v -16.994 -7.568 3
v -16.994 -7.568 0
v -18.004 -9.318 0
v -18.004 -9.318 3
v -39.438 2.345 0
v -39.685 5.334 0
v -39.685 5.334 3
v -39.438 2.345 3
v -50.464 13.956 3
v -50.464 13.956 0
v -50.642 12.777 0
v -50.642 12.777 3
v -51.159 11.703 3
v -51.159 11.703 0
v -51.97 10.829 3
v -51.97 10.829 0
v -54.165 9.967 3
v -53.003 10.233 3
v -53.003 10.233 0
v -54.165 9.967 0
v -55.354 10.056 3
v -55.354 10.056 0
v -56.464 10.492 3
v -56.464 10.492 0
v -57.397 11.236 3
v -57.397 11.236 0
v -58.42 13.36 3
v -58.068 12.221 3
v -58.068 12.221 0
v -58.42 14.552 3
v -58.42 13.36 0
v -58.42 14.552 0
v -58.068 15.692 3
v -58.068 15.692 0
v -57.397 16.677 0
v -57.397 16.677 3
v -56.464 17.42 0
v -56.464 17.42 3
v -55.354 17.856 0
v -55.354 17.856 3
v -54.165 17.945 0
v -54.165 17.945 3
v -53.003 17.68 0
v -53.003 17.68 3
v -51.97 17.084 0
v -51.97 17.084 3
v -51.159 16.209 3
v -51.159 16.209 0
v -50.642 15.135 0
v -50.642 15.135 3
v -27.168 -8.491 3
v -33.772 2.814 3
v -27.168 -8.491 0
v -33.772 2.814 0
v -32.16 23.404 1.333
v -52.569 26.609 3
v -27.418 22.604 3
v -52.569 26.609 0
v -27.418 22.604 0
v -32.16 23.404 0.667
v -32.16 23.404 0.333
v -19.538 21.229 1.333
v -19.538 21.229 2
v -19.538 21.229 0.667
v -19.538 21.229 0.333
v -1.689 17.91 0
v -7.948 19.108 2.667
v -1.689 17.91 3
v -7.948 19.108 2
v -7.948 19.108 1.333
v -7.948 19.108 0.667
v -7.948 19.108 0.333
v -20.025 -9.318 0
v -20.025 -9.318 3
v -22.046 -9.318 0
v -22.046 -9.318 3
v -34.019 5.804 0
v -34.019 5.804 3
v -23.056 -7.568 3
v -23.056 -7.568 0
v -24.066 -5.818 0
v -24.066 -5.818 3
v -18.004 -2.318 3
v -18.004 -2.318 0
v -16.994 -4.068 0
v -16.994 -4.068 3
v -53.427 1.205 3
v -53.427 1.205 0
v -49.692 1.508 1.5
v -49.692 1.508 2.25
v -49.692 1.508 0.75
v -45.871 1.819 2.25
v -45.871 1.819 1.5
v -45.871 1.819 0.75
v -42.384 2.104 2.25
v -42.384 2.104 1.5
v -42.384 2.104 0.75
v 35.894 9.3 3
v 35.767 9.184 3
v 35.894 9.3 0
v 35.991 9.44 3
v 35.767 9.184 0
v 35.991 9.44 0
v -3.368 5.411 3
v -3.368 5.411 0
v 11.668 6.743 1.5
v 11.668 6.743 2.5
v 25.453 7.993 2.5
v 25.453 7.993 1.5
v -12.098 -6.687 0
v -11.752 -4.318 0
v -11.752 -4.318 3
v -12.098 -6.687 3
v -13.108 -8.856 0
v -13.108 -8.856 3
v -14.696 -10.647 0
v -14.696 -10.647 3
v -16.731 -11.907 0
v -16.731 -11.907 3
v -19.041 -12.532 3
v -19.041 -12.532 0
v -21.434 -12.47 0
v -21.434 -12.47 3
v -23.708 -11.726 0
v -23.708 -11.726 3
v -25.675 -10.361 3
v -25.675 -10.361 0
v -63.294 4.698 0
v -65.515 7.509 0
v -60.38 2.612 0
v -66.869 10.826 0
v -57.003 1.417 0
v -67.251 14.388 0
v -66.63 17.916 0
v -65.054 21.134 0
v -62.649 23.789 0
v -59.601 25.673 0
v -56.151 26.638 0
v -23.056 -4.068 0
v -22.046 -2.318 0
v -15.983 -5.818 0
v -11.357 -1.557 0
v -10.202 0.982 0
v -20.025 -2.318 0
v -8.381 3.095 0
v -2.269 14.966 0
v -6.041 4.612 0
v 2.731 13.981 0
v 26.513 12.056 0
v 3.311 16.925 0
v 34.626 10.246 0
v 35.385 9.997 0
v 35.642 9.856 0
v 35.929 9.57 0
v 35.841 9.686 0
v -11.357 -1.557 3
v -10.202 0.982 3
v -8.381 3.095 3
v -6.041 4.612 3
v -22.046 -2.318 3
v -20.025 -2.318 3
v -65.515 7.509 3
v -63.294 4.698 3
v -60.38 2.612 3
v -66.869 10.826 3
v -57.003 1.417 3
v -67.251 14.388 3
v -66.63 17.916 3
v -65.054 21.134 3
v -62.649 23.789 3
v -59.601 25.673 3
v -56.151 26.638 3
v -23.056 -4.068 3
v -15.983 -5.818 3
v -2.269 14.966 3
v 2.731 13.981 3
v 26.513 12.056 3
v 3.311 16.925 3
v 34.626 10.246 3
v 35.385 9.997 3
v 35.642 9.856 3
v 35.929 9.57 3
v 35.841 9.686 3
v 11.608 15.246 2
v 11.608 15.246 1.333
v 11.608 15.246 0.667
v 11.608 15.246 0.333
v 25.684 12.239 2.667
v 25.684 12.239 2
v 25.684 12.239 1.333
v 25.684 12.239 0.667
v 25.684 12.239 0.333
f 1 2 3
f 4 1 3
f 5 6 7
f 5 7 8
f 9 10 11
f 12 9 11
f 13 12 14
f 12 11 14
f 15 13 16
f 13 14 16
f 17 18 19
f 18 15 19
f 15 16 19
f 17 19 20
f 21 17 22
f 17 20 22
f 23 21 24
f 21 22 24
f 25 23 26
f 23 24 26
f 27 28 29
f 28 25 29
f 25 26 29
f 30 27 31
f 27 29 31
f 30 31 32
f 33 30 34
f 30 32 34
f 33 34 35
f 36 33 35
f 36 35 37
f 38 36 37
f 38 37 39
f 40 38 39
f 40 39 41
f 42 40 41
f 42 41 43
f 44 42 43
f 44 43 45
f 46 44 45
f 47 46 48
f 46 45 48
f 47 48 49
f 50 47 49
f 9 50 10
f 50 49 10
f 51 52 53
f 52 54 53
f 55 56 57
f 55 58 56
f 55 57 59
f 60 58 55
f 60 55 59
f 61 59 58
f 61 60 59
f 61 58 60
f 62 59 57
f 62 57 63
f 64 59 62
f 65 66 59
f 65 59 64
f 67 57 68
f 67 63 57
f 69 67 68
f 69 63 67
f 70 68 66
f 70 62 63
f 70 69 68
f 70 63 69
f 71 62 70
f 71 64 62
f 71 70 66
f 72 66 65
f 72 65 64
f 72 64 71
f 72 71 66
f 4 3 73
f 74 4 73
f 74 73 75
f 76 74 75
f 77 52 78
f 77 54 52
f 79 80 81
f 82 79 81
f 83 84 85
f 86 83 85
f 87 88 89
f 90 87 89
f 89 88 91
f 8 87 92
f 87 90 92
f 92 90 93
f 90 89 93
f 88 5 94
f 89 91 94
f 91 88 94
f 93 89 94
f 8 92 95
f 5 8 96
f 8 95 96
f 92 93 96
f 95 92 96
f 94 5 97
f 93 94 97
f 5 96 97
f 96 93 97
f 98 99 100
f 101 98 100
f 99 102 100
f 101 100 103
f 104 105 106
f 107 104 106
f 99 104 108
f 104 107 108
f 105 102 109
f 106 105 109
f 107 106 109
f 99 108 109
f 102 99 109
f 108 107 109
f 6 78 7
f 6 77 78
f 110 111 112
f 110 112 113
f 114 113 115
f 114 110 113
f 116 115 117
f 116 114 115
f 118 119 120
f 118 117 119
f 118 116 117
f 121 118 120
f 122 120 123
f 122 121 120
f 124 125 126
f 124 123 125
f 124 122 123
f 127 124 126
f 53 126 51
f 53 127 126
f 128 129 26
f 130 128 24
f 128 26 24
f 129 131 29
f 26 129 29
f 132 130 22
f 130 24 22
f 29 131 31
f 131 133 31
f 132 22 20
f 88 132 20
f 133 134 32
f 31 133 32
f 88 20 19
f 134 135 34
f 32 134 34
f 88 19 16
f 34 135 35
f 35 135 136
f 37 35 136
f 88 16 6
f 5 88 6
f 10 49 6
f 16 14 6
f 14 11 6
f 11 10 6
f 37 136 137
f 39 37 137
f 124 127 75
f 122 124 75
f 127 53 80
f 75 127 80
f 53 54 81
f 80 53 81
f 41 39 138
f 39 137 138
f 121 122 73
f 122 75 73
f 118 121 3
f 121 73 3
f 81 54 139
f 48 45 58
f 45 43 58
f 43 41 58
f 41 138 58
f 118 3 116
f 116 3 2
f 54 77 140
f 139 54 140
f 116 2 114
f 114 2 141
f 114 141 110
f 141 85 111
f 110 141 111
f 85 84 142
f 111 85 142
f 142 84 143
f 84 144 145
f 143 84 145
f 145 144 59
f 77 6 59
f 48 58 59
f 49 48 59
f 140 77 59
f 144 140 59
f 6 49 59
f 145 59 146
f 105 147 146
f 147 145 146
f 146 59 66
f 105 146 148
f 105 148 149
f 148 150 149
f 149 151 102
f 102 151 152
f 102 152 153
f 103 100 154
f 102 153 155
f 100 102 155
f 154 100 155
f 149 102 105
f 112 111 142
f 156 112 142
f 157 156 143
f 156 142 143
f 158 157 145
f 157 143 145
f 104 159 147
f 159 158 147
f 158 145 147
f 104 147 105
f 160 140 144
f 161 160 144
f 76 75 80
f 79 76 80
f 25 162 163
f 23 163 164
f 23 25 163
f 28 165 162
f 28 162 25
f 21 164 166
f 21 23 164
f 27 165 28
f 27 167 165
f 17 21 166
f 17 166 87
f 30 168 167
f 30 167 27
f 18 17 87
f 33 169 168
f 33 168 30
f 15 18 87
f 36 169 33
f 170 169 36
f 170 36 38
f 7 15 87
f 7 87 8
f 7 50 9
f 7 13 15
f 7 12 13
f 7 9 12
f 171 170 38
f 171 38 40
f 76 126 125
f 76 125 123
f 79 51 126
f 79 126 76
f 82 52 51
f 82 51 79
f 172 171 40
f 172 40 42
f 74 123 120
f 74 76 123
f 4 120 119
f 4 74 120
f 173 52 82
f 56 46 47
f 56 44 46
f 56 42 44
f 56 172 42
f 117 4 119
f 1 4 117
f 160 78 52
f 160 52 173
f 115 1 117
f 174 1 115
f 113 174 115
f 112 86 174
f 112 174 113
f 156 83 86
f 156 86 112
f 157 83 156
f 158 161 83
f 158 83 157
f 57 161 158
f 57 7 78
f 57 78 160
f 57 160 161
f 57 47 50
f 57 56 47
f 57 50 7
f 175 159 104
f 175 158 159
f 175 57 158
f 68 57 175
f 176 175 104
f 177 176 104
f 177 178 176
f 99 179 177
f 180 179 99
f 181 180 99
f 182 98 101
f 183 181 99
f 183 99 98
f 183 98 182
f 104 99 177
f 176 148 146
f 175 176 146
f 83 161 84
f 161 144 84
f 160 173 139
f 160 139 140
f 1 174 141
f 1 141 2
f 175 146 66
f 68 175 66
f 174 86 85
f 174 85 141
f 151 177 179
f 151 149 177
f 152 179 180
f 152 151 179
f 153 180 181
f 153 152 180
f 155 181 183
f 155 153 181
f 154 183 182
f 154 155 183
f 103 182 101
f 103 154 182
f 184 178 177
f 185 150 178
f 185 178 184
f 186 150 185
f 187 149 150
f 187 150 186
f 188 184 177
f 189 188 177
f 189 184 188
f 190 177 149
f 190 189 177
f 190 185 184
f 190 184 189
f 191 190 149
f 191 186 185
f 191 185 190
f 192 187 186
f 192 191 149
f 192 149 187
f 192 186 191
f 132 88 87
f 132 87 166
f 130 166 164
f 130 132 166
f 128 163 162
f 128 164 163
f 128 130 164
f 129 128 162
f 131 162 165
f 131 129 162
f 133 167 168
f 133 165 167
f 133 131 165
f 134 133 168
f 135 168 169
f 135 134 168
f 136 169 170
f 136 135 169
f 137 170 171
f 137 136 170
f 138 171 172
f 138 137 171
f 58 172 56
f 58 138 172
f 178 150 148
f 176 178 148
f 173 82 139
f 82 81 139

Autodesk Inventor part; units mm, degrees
ref_plane "YZ Plane" through (0, 0, 0) normal (1, 0, 0) x (0, 1, 0)
ref_plane "XZ Plane" through (0, 0, 0) normal (0, 1, 0) x (-1, 0, 0)
ref_plane "XY Plane" through (0, 0, 0) normal (0, 0, 1) x (1, 0, 0)
sketch "Sketch1" plane through (0, 0, 0) normal (0, 0, 1) x (1, 0, 0)
  spline S0 degree 2 poles (-40.9982, 18.5994) (-40.8895, 18.5833) (-40.7809, 18.5671) knots 0 0 0 1 1 1
  line L0 (-40.803, 18.5704) -> (-40.7587, 18.5638) construction
  arc A0 (-40.7631, 18.5645) -> (-40.7986, 18.5698) centre (-56.3605, -86.2568) ccw construction
  line L1 (-39.6852, 5.3344) -> (-39.4376, 2.3446)
  line L2 (-39.4376, 2.3446) -> (-33.7717, 2.8138)
  line L3 (-33.7717, 2.8138) -> (-34.0193, 5.8036)
  line L4 (-2.2691, 14.9664) -> (-1.6892, 17.9098)
  line L5 (2.7309, 13.9813) -> (-2.2691, 14.9664)
  line L6 (3.3108, 16.9248) -> (2.7309, 13.9813)
  line L7 (-1.6892, 17.9098) -> (3.3108, 16.9248)
  spline S1 degree 4 poles (-52.5686, 26.6086) (-47.4283, 25.8385) (-38.8524, 24.5329) (-27.5314, 22.6621) (-13.8317, 20.2238) (-2.8447, 18.1596) (6.9136, 16.2106) (15.3612, 14.4912) (22.3415, 12.9265) (29.1518, 11.5542) (33.1688, 10.3476) (35.6871, 10.2817) (35.9914, 9.4396) knots 0 0 0 0 0 0.183688 0.302378 0.416104 0.523956 0.624947 0.717922 0.80148 0.87369 1 1 1 1 1
  line L8 (-34.0193, 5.8036) -> (-39.6852, 5.3344)
  arc A1 (-52.5686, 26.6086) -> (-53.4266, 1.2046) centre (-54.4643, 13.9562) ccw
  circle A2 centre (-54.4643, 13.9562) radius 4
  circle A3 centre (-20.0248, -5.8183) radius 3.5
  line L9 (-33.7717, 2.8138) -> (-27.1682, -8.491)
  arc A4 (-3.3682, 5.4114) -> (-11.7521, -4.3183) centre (-1.9143, -4.3183) ccw
  arc A5 (-27.1682, -8.491) -> (-11.7521, -4.3183) centre (-20.0248, -4.3183) ccw
  spline S2 degree 4 poles (-53.4266, 1.2046) (-47.7035, 1.6704) (-39.4686, 2.3386) (-37.3837, 2.5127) (-33.7717, 2.8138) knots 0 0 0 0 0 1 1 1 1 1
  line L10 (-35.7599, 2.6481) -> (-31.7835, 2.9795) construction
  arc A6 (-32.1812, 2.9462) -> (-35.3623, 2.6811) centre (796.8879, -9962.6267) ccw construction
  spline S3 degree 4 poles (-3.3682, 5.4114) (-2.8714, 5.455) (-2.6988, 5.4696) (10.1379, 6.6067) (14.5902, 6.9981) (22.2245, 7.7443) (28.8501, 8.2309) (33.1083, 8.9133) (35.5672, 8.6498) (35.9914, 9.4396) knots 0 0 0 0 0 0.172623 0.316544 0.485874 0.63811 0.76971 1 1 1 1 1
  line L11 (-7.9773, 5.0072) -> (1.2409, 5.8157) construction
  arc A7 (0.3196, 5.7283) -> (-7.0549, 5.0815) centre (88.3466, -1040.3487) ccw construction
  line L12 (70.0994, 77.6585) -> (70.0994, -40.6368)
  line L13 (142.4679, 14.9664) -> (141.888, 17.9098)
  line L14 (137.4679, 13.9813) -> (142.4679, 14.9664)
  line L15 (136.888, 16.9248) -> (137.4679, 13.9813)
  line L16 (141.888, 17.9098) -> (136.888, 16.9248)
  spline S4 degree 4 poles (192.7674, 26.6086) (187.6271, 25.8385) (179.0512, 24.5329) (167.7302, 22.6621) (154.0305, 20.2238) (143.0435, 18.1596) (133.2852, 16.2106) (124.8376, 14.4912) (117.8573, 12.9265) (111.047, 11.5542) (107.03, 10.3476) (104.5117, 10.2817) (104.2074, 9.4396) knots 0 0 0 0 0 0.183688 0.302378 0.416104 0.523956 0.624947 0.717922 0.80148 0.87369 1 1 1 1 1
  spline S5 degree 2 poles (181.197, 18.5994) (181.0883, 18.5833) (180.9797, 18.5671) knots 0 0 0 1 1 1
  line L17 (181.0018, 18.5704) -> (180.9575, 18.5638) construction
  arc A8 (180.9974, 18.5698) -> (180.9619, 18.5645) centre (196.5593, -86.2568) ccw construction
  line L18 (173.9705, 2.8138) -> (174.2181, 5.8036)
  line L19 (174.2181, 5.8036) -> (179.8839, 5.3344)
  line L20 (179.8839, 5.3344) -> (179.6364, 2.3446)
  line L21 (179.6364, 2.3446) -> (173.9705, 2.8138)
  arc A9 (193.6254, 1.2046) -> (192.7674, 26.6086) centre (194.6631, 13.9562) ccw
  circle A10 centre (194.6631, 13.9562) radius 4
  circle A11 centre (160.2236, -5.8183) radius 3.5
  line L22 (173.9705, 2.8138) -> (167.367, -8.491)
  arc A12 (151.9509, -4.3183) -> (143.567, 5.4114) centre (142.1131, -4.3183) ccw
  arc A13 (161.3154, 3.8821) -> (160.5367, 3.9485) centre (160.2236, -4.3183) ccw
  arc A14 (151.9509, -4.3183) -> (167.367, -8.491) centre (160.2236, -4.3183) ccw
  line L23 (175.9587, 2.6481) -> (171.9823, 2.9795) construction
  arc A15 (175.5611, 2.6811) -> (172.38, 2.9462) centre (-656.6891, -9962.6267) ccw construction
  spline S6 degree 4 poles (193.6254, 1.2046) (187.9023, 1.6704) (179.6674, 2.3386) (177.5825, 2.5127) (173.9705, 2.8138) knots 0 0 0 0 0 1 1 1 1 1
  spline S7 degree 1 poles (161.3154, 3.8821) (160.5367, 3.9485) knots 0 0 1 1
  spline S8 degree 4 poles (143.567, 5.4114) (143.0702, 5.455) (142.8976, 5.4696) (130.0609, 6.6067) (125.6086, 6.9981) (117.9743, 7.7443) (111.3487, 8.2309) (107.0905, 8.9133) (104.6315, 8.6498) (104.2074, 9.4396) knots 0 0 0 0 0 0.172623 0.316544 0.485874 0.63811 0.76971 1 1 1 1 1
  line L24 (148.1761, 5.0072) -> (138.9579, 5.8157) construction
  arc A16 (147.2537, 5.0815) -> (139.8792, 5.7283) centre (51.8522, -1040.3487) ccw construction
  line L25 (-15.9834, -5.8183) -> (-18.0041, -9.3183)
  line L26 (-18.0041, -9.3183) -> (-22.0456, -9.3183)
  line L27 (-22.0456, -9.3183) -> (-24.0663, -5.8183)
  line L28 (-24.0663, -5.8183) -> (-22.0456, -2.3183)
  line L29 (-22.0456, -2.3183) -> (-18.0041, -2.3183)
  line L30 (-18.0041, -2.3183) -> (-15.9834, -5.8183)
  point P0 (0, 0)
  point P1 (-17.9436, 10.4444)
  point P2 (-26.2526, 3.4456)
  point P3 (-14.0156, 4.4896)
  point P4 (15.6814, 7.1116)
  point P5 (22.8694, 7.7686)
  point P6 (28.5454, 8.2966)
  point P7 (32.6494, 8.6836)
  point P8 (35.1304, 8.9206)
  point P9 (-38.5796, 24.4516)
  point P10 (-25.4276, 22.2616)
  point P11 (-13.2626, 20.0956)
  point P12 (-2.2076, 18.0106)
  point P13 (7.6174, 16.0606)
  point P14 (16.1074, 14.2996)
  point P15 (23.1784, 12.7756)
  point P16 (28.7524, 11.5396)
  point P17 (32.7784, 10.6276)
  point P18 (35.2084, 10.0696)
  point P19 (-67.2506, 14.3918)
  point P20 (-5.9186, 11.5242)
  point P21 (-6.911, 11.4294)
  point P22 (-8.5526, 11.2746)
  point P23 (-10.823, 11.0634)
  point P24 (-13.6982, 10.8006)
  point P25 (-17.1422, 10.4898)
  point P26 (-21.1166, 10.1382)
  point P27 (-25.577, 9.7518)
  point P28 (-30.4718, 9.3342)
  point P29 (-35.7458, 8.8938)
  point P30 (-5.8874, 11.9838)
  point P31 (-6.8594, 12.207)
  point P32 (-8.4698, 12.5718)
  point P33 (-10.6994, 13.0662)
  point P34 (-13.5278, 13.6758)
  point P35 (-16.9238, 14.3802)
  point P36 (-20.8538, 15.1602)
  point P37 (-25.2758, 15.9942)
  point P38 (-30.1418, 16.8606)
  point P39 (-35.4026, 17.7366)
  point P40 (-5.5742, 11.7318)
  point P41 (-41.3414, 8.4378)
  point P42 (35.2084, 9.4987)
  point P43 (32.7784, 9.6618)
  point P44 (28.7524, 9.9279)
  point P45 (23.1784, 10.2865)
  point P46 (16.1074, 10.7251)
  point P47 (7.6174, 11.2223)
  point P48 (-2.2076, 11.7622)
  point P49 (-13.2626, 12.3252)
  point P50 (-25.4276, 12.8888)
  point P51 (-38.5796, 13.434)
  point P52 (-52.5686, 13.9416)
  point P53 (35.9914, 8.9986)
  point P54 (-68.0606, 0.0436)
  point P55 (-67.2506, 28.6756)
  point P56 (35.9914, 9.8806)
  point P57 (140.1988, 0)
  point P58 (158.1424, 10.4444)
  point P59 (178.7784, 24.4516)
  point P60 (165.6264, 22.2616)
  point P61 (153.4614, 20.0956)
  point P62 (142.4064, 18.0106)
  point P63 (132.5814, 16.0606)
  point P64 (124.0914, 14.2996)
  point P65 (117.0204, 12.7756)
  point P66 (111.4464, 11.5396)
  point P67 (107.4204, 10.6276)
  point P68 (104.9904, 10.0696)
  point P69 (166.4514, 3.4456)
  point P70 (154.2144, 4.4896)
  point P71 (124.5174, 7.1116)
  point P72 (117.3294, 7.7686)
  point P73 (111.6534, 8.2966)
  point P74 (107.5494, 8.6836)
  point P75 (105.0684, 8.9206)
  point P76 (207.4494, 14.3918)
  point P77 (104.2074, 9.8806)
  point P78 (207.4494, 28.6756)
  point P79 (208.2594, 0.0436)
  point P80 (104.2074, 8.9986)
  point P81 (192.7674, 13.9416)
  point P82 (178.7784, 13.434)
  point P83 (165.6264, 12.8888)
  point P84 (153.4614, 12.3252)
  point P85 (142.4064, 11.7622)
  point P86 (132.5814, 11.2223)
  point P87 (124.0914, 10.7251)
  point P88 (117.0204, 10.2865)
  point P89 (111.4464, 9.9279)
  point P90 (107.4204, 9.6618)
  point P91 (104.9904, 9.4987)
  point P92 (181.5402, 8.4378)
  point P93 (145.773, 11.7318)
  point P94 (175.6014, 17.7366)
  point P95 (170.3406, 16.8606)
  point P96 (165.4746, 15.9942)
  point P97 (161.0526, 15.1602)
  point P98 (157.1226, 14.3802)
  point P99 (153.7266, 13.6758)
  point P100 (150.8982, 13.0662)
  point P101 (148.6686, 12.5718)
  point P102 (147.0582, 12.207)
  point P103 (146.0862, 11.9838)
  point P104 (175.9446, 8.8938)
  point P105 (170.6706, 9.3342)
  point P106 (165.7758, 9.7518)
  point P107 (161.3154, 10.1382)
  point P108 (157.341, 10.4898)
  point P109 (153.897, 10.8006)
  point P110 (151.0218, 11.0634)
  point P111 (148.7514, 11.2746)
  point P112 (147.1098, 11.4294)
  point P113 (146.1174, 11.5242)
  dimension "d0" = 3
  dimension "d1" = 5
  dimension "d2" = 52.7751
  dimension "d3" = 3
  dimension "d4" = 5.6658
  dimension "d9" = 8
  dimension "d11" = 7
extrude "Extrusion2" add sketch "Sketch1" along normal blind 3 contours L1 S2 A1 S1 L4 L5 L6 S3 A4 A5 L9 L3 L8
properties part number "2P.03.01.08.JW.AileronRibMid" material "Wood (Walnut)"
